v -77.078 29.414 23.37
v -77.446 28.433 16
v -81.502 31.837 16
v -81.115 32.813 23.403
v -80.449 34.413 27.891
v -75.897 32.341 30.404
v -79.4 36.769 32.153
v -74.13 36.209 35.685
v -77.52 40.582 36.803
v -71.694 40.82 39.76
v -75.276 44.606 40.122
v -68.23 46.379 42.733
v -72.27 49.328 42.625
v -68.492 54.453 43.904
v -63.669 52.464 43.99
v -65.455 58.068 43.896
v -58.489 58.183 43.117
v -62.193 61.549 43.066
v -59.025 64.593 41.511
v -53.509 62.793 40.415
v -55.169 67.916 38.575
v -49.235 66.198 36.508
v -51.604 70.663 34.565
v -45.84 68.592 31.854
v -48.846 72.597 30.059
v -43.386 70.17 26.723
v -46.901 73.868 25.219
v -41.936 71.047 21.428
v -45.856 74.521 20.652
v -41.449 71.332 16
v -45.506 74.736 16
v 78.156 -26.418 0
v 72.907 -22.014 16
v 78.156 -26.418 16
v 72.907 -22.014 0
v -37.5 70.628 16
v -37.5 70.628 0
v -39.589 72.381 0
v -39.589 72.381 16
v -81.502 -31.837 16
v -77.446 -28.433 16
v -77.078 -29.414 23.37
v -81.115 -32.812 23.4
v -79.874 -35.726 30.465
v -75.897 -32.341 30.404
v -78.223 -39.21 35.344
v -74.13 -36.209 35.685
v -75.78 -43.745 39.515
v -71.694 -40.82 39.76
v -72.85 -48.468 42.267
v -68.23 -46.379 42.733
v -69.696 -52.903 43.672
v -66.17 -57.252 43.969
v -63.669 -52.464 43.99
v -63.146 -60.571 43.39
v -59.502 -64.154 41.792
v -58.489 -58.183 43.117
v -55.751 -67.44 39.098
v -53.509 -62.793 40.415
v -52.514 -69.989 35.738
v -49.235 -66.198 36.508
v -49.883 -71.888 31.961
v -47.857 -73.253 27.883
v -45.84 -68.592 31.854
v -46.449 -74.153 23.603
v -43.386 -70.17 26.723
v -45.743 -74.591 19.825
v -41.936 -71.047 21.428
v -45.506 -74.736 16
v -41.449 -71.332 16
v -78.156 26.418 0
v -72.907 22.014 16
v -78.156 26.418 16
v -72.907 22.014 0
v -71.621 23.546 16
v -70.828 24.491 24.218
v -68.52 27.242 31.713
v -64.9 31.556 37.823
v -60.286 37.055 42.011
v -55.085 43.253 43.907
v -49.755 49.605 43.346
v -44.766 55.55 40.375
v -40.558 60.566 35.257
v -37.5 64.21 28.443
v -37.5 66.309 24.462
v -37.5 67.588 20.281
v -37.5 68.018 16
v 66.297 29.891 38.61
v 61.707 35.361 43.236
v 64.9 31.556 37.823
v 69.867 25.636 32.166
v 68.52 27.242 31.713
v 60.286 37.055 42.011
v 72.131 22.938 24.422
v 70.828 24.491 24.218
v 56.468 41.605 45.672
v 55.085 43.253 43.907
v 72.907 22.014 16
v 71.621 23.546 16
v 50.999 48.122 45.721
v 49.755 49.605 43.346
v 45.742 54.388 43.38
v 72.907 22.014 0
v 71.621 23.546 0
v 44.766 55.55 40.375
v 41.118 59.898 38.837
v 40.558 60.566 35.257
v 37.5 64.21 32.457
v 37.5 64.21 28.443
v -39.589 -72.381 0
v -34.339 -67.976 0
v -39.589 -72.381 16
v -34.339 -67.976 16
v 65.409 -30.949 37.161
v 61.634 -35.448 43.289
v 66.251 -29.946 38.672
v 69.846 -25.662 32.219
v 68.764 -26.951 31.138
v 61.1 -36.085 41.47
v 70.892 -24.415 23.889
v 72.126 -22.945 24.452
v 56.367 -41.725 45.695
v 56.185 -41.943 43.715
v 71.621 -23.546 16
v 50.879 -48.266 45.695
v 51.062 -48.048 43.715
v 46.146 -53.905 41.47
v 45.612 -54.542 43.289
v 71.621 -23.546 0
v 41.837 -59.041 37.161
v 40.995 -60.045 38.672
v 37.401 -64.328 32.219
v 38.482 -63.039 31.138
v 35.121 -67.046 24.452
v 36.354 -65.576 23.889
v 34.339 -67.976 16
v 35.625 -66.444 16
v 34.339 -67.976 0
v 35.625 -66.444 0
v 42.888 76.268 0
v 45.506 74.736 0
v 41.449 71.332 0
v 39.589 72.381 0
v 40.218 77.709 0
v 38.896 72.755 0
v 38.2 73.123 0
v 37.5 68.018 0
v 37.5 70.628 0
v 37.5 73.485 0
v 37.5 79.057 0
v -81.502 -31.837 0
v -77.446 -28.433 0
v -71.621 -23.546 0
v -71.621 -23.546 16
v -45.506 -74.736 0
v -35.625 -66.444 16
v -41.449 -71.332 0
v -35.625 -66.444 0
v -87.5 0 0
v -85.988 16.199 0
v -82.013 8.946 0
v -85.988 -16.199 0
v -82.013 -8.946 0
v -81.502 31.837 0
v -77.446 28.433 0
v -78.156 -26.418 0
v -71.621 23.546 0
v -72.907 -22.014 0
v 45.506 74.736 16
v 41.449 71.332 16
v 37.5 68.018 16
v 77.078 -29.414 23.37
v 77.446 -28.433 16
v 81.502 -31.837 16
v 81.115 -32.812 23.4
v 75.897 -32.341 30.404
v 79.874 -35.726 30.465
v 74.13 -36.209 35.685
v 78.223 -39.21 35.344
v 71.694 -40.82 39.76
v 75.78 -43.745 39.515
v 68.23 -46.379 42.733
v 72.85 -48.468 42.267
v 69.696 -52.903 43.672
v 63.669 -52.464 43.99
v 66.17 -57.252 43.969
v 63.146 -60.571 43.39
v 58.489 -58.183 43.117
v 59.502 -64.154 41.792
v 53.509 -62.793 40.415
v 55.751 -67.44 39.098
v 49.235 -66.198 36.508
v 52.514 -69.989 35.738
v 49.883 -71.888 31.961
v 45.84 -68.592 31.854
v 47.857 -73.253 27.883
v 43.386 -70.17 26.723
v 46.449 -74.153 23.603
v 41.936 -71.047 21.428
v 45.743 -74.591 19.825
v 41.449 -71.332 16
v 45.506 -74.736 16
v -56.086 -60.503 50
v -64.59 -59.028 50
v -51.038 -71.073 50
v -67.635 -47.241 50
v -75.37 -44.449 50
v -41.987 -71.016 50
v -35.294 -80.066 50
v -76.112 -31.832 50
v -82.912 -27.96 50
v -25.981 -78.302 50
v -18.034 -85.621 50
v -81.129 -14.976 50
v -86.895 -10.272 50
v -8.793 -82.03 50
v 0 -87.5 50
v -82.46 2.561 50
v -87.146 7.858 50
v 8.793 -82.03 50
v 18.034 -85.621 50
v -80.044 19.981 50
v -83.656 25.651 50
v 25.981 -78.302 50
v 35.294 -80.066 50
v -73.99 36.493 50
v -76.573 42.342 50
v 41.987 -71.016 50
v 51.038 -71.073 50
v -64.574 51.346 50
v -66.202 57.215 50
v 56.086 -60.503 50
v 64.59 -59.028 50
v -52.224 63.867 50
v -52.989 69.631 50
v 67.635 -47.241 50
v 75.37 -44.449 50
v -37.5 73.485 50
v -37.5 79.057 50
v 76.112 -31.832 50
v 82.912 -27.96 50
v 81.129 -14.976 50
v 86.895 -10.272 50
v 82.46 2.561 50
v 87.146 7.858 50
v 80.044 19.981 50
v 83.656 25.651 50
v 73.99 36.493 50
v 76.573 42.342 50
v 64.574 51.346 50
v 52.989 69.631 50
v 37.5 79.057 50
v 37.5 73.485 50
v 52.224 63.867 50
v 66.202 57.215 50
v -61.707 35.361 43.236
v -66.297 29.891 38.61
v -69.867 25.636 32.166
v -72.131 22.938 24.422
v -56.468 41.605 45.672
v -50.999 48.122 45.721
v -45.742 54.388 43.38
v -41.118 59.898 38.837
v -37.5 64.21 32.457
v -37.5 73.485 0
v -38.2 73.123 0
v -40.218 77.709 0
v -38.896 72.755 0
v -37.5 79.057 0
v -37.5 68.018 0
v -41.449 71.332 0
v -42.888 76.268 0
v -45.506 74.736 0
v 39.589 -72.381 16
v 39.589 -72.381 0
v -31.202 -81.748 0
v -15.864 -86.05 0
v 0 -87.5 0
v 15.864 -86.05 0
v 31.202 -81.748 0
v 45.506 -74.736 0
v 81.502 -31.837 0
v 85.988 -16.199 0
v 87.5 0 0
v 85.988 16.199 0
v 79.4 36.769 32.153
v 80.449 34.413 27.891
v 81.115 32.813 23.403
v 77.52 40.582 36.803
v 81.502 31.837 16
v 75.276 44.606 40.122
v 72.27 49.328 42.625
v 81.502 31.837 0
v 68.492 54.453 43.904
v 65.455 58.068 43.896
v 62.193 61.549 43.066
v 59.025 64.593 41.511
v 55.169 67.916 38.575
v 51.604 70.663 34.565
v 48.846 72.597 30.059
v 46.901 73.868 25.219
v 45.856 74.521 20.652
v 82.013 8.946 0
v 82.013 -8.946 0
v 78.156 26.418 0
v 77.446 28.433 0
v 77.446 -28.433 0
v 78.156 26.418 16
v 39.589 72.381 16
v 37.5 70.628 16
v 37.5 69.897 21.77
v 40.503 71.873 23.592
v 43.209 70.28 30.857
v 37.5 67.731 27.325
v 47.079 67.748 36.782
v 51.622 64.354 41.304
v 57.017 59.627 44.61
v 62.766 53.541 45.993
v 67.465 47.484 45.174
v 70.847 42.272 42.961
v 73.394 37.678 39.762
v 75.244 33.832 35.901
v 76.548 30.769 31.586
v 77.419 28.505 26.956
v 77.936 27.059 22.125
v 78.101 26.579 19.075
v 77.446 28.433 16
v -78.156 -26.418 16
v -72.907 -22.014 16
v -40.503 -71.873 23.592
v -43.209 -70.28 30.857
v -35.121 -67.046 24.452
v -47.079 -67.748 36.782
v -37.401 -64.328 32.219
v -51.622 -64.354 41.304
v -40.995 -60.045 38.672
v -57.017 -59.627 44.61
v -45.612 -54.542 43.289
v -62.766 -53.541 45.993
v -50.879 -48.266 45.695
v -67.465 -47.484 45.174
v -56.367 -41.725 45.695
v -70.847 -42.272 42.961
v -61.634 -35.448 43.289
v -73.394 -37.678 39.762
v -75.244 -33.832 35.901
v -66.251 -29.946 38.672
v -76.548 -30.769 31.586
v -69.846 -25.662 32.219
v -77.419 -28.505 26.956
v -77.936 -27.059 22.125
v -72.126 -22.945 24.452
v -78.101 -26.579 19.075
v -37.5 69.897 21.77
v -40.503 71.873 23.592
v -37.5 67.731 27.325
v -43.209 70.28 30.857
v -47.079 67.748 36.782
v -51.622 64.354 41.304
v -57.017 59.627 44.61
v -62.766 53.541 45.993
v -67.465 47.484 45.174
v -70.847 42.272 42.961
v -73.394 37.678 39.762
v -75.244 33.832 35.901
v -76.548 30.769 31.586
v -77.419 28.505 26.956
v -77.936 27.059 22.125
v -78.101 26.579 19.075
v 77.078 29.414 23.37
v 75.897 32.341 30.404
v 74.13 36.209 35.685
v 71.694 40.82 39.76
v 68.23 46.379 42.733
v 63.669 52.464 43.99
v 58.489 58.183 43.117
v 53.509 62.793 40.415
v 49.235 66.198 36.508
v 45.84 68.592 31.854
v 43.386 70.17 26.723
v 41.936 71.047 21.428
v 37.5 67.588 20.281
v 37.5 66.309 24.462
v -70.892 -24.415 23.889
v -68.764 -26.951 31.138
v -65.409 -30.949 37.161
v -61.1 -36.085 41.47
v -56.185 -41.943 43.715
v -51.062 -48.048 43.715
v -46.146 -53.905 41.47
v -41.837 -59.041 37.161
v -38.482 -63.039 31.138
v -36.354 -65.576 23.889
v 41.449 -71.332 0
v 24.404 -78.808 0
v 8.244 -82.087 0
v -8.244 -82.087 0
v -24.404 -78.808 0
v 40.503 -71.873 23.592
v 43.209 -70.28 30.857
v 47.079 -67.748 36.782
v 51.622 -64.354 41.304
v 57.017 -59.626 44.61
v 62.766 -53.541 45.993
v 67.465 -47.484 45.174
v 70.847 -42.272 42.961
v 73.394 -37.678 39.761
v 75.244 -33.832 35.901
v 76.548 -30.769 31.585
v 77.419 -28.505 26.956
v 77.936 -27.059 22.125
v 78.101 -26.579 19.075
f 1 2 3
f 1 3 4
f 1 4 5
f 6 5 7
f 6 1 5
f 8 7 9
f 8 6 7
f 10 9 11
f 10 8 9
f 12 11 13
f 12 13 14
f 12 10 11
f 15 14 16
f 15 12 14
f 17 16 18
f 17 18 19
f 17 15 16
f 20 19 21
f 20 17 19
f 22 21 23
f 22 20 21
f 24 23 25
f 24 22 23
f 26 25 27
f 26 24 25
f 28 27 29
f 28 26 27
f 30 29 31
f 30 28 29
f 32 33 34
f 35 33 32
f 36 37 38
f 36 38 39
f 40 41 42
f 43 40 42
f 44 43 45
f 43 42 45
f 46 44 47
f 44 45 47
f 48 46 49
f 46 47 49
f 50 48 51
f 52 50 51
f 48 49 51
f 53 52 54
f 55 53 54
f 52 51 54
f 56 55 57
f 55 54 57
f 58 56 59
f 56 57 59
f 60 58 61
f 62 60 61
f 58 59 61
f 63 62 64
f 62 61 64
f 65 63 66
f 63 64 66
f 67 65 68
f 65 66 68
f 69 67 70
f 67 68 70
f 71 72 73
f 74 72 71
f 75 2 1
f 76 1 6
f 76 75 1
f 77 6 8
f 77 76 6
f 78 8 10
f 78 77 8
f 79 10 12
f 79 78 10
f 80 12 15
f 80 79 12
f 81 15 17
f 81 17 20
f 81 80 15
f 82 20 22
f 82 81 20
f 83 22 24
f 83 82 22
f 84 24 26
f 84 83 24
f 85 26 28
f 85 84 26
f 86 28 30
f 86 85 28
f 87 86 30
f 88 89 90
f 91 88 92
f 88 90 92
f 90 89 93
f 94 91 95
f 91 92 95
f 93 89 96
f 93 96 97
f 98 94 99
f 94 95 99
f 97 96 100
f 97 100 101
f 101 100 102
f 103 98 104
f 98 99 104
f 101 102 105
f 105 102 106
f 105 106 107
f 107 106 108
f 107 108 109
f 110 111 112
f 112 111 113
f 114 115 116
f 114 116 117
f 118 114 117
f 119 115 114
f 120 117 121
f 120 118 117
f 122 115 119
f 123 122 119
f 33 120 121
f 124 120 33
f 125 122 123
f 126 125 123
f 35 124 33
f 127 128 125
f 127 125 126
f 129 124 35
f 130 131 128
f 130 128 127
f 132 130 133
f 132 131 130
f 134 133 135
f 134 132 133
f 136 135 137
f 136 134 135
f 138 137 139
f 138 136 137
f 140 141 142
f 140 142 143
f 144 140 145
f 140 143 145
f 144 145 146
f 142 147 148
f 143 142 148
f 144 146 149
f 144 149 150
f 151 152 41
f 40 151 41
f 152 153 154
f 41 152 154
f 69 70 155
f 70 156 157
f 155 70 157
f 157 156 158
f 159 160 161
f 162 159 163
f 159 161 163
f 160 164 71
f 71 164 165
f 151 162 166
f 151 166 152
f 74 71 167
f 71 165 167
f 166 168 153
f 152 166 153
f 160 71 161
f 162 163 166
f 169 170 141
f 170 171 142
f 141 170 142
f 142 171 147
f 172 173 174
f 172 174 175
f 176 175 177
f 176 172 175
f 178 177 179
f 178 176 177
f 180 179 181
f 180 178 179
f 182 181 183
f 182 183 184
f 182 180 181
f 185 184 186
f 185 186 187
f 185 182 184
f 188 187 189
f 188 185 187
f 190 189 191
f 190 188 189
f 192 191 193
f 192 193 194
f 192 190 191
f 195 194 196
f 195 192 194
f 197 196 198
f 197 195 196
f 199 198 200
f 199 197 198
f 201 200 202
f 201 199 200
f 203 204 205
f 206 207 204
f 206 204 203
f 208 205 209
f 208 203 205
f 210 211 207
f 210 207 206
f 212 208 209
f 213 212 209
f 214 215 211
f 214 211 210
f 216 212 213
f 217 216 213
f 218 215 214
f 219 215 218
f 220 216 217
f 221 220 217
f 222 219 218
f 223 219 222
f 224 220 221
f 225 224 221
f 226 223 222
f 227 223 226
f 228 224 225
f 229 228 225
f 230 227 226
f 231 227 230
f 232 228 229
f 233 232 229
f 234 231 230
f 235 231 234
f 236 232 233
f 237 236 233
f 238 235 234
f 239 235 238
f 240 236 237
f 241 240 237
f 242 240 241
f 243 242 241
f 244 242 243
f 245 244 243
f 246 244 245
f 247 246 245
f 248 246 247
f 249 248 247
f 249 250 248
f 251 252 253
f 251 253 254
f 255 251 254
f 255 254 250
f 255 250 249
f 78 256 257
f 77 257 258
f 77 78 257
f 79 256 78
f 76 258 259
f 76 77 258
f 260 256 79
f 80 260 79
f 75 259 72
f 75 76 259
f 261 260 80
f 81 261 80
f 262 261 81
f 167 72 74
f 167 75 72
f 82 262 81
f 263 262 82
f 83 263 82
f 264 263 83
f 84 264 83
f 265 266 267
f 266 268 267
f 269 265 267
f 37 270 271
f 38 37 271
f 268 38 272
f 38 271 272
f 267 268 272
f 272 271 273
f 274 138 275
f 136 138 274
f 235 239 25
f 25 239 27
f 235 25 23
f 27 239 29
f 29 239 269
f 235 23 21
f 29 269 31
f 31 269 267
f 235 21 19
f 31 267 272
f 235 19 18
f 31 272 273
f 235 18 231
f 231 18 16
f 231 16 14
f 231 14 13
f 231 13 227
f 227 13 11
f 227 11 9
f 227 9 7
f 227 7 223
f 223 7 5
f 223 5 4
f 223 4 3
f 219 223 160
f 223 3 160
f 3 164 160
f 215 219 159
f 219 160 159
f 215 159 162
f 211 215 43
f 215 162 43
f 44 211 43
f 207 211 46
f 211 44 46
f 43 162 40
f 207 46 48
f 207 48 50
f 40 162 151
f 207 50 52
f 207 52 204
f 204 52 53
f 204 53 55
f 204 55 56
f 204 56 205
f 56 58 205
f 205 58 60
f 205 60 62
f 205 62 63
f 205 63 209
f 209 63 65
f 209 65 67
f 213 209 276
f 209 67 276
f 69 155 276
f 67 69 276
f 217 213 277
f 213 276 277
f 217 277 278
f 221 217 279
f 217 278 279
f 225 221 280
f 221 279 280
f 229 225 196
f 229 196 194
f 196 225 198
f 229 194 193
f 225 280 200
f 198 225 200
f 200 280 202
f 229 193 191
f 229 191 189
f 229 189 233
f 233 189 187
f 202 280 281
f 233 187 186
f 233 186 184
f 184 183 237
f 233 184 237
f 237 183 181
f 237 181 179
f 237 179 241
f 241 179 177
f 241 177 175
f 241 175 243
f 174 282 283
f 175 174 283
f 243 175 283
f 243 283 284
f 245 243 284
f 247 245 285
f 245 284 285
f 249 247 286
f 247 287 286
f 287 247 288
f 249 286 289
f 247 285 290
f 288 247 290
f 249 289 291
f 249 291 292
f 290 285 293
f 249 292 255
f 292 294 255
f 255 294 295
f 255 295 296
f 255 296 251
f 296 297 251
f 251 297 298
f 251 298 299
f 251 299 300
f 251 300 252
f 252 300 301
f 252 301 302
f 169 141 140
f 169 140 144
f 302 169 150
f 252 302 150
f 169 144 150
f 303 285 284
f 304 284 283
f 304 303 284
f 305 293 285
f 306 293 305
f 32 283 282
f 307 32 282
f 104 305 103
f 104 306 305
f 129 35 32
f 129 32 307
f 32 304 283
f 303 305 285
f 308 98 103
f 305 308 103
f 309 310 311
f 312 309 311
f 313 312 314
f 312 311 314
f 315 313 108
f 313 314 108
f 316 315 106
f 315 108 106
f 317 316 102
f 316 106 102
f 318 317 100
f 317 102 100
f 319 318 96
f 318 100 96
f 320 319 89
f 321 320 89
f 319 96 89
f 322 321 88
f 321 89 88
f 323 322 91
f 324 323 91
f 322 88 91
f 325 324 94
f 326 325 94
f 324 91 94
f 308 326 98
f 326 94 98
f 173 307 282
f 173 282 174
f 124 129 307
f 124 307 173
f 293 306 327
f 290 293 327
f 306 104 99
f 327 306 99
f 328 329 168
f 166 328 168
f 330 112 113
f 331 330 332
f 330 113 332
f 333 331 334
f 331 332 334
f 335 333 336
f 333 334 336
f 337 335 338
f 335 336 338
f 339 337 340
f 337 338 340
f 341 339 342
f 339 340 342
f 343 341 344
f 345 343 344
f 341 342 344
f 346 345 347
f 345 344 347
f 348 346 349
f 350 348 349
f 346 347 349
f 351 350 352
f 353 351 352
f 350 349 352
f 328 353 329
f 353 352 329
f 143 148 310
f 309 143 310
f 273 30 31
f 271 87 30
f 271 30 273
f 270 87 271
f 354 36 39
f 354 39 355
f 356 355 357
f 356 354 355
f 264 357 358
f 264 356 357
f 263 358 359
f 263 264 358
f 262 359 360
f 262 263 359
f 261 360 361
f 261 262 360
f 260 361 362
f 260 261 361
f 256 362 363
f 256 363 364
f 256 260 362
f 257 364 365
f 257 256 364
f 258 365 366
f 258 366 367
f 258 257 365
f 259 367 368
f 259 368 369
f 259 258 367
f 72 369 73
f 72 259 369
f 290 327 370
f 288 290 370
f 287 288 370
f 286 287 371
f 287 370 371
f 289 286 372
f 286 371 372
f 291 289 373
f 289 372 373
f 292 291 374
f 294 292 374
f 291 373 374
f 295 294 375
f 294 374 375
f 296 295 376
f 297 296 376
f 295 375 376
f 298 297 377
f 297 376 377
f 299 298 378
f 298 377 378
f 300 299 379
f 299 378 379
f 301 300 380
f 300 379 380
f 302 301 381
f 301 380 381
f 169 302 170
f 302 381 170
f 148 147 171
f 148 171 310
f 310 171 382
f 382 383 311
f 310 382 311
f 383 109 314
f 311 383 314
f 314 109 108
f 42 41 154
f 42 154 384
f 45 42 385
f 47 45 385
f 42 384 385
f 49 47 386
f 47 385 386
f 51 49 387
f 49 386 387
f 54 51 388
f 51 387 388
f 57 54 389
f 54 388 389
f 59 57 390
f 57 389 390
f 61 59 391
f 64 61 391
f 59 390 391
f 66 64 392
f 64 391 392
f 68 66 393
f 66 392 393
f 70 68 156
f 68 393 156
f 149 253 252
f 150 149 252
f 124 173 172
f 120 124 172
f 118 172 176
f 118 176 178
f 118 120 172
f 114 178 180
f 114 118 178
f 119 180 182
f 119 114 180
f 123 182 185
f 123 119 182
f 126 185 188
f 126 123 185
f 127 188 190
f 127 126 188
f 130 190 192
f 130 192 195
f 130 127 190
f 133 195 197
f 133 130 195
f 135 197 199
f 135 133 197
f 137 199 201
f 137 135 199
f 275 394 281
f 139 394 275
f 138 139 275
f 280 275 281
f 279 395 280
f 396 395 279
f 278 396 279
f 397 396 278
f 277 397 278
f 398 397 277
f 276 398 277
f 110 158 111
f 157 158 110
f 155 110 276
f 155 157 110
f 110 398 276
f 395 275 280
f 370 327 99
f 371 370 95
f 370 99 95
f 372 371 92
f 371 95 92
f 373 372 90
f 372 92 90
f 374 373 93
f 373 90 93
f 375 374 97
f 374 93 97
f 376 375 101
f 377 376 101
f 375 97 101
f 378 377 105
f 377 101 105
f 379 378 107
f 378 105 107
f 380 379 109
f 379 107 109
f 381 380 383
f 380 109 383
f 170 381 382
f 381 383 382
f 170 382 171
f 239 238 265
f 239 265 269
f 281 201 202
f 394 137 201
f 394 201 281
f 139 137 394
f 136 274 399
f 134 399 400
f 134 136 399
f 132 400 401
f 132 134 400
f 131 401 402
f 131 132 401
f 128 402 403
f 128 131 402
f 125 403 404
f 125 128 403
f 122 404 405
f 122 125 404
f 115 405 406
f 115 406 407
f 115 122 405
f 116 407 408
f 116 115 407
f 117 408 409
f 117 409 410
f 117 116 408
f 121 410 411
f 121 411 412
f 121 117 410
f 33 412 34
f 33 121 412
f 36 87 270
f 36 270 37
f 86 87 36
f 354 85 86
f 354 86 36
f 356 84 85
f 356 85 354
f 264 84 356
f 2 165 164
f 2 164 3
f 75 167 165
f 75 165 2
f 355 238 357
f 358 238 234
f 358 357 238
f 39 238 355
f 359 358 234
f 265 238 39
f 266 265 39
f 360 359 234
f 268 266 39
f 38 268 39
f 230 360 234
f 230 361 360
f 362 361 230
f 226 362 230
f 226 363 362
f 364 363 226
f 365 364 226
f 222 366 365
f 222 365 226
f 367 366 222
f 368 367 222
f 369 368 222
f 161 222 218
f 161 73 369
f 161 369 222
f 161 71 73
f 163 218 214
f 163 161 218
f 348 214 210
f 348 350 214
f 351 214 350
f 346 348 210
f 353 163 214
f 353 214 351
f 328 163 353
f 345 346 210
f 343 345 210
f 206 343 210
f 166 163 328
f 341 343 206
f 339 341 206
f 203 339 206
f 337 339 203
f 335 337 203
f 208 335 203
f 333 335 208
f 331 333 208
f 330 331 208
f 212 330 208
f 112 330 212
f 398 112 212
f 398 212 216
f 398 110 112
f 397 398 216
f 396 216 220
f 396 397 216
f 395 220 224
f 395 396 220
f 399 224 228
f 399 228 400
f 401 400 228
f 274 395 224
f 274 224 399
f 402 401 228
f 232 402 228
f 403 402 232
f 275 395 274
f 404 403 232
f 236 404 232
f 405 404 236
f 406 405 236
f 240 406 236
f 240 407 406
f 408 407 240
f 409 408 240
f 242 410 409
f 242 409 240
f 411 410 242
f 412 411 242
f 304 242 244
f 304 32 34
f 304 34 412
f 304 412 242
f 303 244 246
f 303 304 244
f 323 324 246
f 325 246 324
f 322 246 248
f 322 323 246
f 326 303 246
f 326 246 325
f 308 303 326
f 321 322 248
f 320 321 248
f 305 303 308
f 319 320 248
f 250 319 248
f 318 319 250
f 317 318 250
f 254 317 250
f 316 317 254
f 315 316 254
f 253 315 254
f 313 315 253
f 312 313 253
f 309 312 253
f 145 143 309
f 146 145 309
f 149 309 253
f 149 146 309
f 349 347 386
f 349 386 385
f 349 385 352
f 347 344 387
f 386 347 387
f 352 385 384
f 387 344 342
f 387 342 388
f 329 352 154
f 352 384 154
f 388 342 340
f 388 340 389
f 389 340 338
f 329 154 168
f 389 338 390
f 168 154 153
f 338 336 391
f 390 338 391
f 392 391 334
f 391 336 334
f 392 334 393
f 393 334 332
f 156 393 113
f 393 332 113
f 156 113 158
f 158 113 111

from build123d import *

# Parameters (mm, degrees)
SKETCH1_R                                     = 87.5
SKETCH1_R_2                                   = 82.5
BOSS_EXTRUDE1_DEPTH                           = 50
CUT_EXTRUDE1_DEPTH                            = 134.46347815
BOSS_EXTRUDE2_REACH                           = 201.927
BOSS_EXTRUDE2_END_RADIUS                      = 82.5
MIRROR1_AT_THE_SECOND_PLANE_COPY_1_DEPTH      = 134.46347815
MIRROR1_AT_THE_SECOND_PLANE_COPY_2_REACH      = 201.927
MIRROR1_AT_THE_SECOND_PLANE_COPY_2_END_RADIUS = 82.5
SKETCH4_W                                     = 75
SKETCH4_H                                     = 150.506250548
CUT_EXTRUDE2_DEPTH                            = 134.463478319


with BuildPart() as part:
    # Sketch1 → Boss-Extrude1 (new body)
    with BuildSketch(Plane.XY):
        Circle(SKETCH1_R)
        Circle(SKETCH1_R_2, mode=Mode.SUBTRACT)
    extrude(amount=BOSS_EXTRUDE1_DEPTH)

    # Sketch3 → Cut-Extrude1 (cut, through all)
    with BuildSketch(Plane(origin=(0, 0, 0), x_dir=(0, 0, 1), z_dir=(-0.7660444431189792, 0.6427876096865379, 0))):
        with BuildLine():
            Line((16, 28), (-21.315886337, 28))
            Line((-21.315886337, 28), (-21.315886337, -28))
            Line((-21.315886337, -28), (16, -28))
            ThreePointArc((16, -28), (44, 0), (16, 28))
        make_face()
    cut_extrude1 = extrude(amount=CUT_EXTRUDE1_DEPTH, mode=Mode.SUBTRACT)

    # Boss-Extrude2: up to this cylinder (the profile starts inside it)
    boss_extrude2_end = Plane(origin=(0, 0, 8), z_dir=(0, 0, -1)) * Cylinder(BOSS_EXTRUDE2_END_RADIUS, 569.854, mode=Mode.PRIVATE)
    # Sketch5 → Boss-Extrude2 (add, up to the surface)
    with BuildSketch(Plane(origin=(-53.623111018, 44.995132678, 0), x_dir=(0, 0, 1), z_dir=(-0.7660444431189792, 0.6427876096865379, 0)), mode=Mode.PRIVATE) as boss_extrude2_sk1:
        with BuildLine():
            Line((0, -28), (16, -28))
            ThreePointArc((16, -28), (44, 0), (16, 28))
            Line((16, 28), (0, 28))
            Line((0, 28), (0, 30))
            Line((0, 30), (16, 30))
            ThreePointArc((16, 30), (46, 0), (16, -30))
            Line((16, -30), (0, -30))
            Line((0, -30), (0, -28))
        make_face()
    boss_extrude2_tool1 = extrude(boss_extrude2_sk1.sketch, amount=BOSS_EXTRUDE2_REACH, mode=Mode.PRIVATE) & boss_extrude2_end
    boss_extrude2 = boss_extrude2_tool1.solids().sort_by_distance((-72.420765, 22.592961, 8))[0]
    add(boss_extrude2)

    # Mirror1: Cut-Extrude1, Boss-Extrude2 across plane
    add(cut_extrude1.mirror(Plane(origin=(0, 0, 0), x_dir=(0, 0, 1), z_dir=(1, 0, 0))), mode=Mode.SUBTRACT)
    add(boss_extrude2.mirror(Plane(origin=(0, 0, 0), x_dir=(0, 0, 1), z_dir=(1, 0, 0))))

    # Mirror1 at the second plane: Cut-Extrude1, Boss-Extrude2 across plane
    add(cut_extrude1.mirror(Plane.ZX), mode=Mode.SUBTRACT)
    add(boss_extrude2.mirror(Plane.ZX))

    # Mirror1 at the second plane copy 1 sketc → Mirror1 at the second plane copy 1 (cut, through all)
    with BuildSketch(Plane(origin=(0, 0, 0), x_dir=(0, 0, 1), z_dir=(0.7660444431189792, -0.6427876096865379, 0))):
        with BuildLine():
            Line((16, 28), (-21.315886337, 28))
            Line((-21.315886337, 28), (-21.315886337, -28))
            Line((-21.315886337, -28), (16, -28))
            ThreePointArc((16, -28), (44, 0), (16, 28))
        make_face()
    extrude(amount=MIRROR1_AT_THE_SECOND_PLANE_COPY_1_DEPTH, mode=Mode.SUBTRACT)

    # Mirror1 at the second plane copy 2: up to this cylinder (the profile starts inside it)
    mirror1_at_the_second_plane_copy_2_end = Plane(origin=(0, 0, 8), z_dir=(0, 0, -1)) * Cylinder(MIRROR1_AT_THE_SECOND_PLANE_COPY_2_END_RADIUS, 569.854, mode=Mode.PRIVATE)
    # Mirror1 at the second plane copy 2 sketc → Mirror1 at the second plane copy 2 (add, up to the surface)
    with BuildSketch(Plane(origin=(53.623111018, -44.995132678, 0), x_dir=(0, 0, 1), z_dir=(0.7660444431189792, -0.6427876096865379, 0)), mode=Mode.PRIVATE) as mirror1_at_the_second_plane_copy_2_sk1:
        with BuildLine():
            Line((0, -28), (16, -28))
            ThreePointArc((16, -28), (44, 0), (16, 28))
            Line((16, 28), (0, 28))
            Line((0, 28), (0, 30))
            Line((0, 30), (16, 30))
            ThreePointArc((16, 30), (46, 0), (16, -30))
            Line((16, -30), (0, -30))
            Line((0, -30), (0, -28))
        make_face()
    mirror1_at_the_second_plane_copy_2_tool1 = extrude(mirror1_at_the_second_plane_copy_2_sk1.sketch, amount=MIRROR1_AT_THE_SECOND_PLANE_COPY_2_REACH, mode=Mode.PRIVATE) & mirror1_at_the_second_plane_copy_2_end
    add(mirror1_at_the_second_plane_copy_2_tool1.solids().sort_by_distance((-72.420765, 22.592961, 8))[0])

    # Sketch4 → Cut-Extrude2 (cut, through all)
    with BuildSketch(Plane.XY.offset(50)):
        with Locations((0, 75.253125274)):
            Rectangle(SKETCH4_W, SKETCH4_H)
    extrude(amount=-CUT_EXTRUDE2_DEPTH, mode=Mode.SUBTRACT)


solid = part.part
